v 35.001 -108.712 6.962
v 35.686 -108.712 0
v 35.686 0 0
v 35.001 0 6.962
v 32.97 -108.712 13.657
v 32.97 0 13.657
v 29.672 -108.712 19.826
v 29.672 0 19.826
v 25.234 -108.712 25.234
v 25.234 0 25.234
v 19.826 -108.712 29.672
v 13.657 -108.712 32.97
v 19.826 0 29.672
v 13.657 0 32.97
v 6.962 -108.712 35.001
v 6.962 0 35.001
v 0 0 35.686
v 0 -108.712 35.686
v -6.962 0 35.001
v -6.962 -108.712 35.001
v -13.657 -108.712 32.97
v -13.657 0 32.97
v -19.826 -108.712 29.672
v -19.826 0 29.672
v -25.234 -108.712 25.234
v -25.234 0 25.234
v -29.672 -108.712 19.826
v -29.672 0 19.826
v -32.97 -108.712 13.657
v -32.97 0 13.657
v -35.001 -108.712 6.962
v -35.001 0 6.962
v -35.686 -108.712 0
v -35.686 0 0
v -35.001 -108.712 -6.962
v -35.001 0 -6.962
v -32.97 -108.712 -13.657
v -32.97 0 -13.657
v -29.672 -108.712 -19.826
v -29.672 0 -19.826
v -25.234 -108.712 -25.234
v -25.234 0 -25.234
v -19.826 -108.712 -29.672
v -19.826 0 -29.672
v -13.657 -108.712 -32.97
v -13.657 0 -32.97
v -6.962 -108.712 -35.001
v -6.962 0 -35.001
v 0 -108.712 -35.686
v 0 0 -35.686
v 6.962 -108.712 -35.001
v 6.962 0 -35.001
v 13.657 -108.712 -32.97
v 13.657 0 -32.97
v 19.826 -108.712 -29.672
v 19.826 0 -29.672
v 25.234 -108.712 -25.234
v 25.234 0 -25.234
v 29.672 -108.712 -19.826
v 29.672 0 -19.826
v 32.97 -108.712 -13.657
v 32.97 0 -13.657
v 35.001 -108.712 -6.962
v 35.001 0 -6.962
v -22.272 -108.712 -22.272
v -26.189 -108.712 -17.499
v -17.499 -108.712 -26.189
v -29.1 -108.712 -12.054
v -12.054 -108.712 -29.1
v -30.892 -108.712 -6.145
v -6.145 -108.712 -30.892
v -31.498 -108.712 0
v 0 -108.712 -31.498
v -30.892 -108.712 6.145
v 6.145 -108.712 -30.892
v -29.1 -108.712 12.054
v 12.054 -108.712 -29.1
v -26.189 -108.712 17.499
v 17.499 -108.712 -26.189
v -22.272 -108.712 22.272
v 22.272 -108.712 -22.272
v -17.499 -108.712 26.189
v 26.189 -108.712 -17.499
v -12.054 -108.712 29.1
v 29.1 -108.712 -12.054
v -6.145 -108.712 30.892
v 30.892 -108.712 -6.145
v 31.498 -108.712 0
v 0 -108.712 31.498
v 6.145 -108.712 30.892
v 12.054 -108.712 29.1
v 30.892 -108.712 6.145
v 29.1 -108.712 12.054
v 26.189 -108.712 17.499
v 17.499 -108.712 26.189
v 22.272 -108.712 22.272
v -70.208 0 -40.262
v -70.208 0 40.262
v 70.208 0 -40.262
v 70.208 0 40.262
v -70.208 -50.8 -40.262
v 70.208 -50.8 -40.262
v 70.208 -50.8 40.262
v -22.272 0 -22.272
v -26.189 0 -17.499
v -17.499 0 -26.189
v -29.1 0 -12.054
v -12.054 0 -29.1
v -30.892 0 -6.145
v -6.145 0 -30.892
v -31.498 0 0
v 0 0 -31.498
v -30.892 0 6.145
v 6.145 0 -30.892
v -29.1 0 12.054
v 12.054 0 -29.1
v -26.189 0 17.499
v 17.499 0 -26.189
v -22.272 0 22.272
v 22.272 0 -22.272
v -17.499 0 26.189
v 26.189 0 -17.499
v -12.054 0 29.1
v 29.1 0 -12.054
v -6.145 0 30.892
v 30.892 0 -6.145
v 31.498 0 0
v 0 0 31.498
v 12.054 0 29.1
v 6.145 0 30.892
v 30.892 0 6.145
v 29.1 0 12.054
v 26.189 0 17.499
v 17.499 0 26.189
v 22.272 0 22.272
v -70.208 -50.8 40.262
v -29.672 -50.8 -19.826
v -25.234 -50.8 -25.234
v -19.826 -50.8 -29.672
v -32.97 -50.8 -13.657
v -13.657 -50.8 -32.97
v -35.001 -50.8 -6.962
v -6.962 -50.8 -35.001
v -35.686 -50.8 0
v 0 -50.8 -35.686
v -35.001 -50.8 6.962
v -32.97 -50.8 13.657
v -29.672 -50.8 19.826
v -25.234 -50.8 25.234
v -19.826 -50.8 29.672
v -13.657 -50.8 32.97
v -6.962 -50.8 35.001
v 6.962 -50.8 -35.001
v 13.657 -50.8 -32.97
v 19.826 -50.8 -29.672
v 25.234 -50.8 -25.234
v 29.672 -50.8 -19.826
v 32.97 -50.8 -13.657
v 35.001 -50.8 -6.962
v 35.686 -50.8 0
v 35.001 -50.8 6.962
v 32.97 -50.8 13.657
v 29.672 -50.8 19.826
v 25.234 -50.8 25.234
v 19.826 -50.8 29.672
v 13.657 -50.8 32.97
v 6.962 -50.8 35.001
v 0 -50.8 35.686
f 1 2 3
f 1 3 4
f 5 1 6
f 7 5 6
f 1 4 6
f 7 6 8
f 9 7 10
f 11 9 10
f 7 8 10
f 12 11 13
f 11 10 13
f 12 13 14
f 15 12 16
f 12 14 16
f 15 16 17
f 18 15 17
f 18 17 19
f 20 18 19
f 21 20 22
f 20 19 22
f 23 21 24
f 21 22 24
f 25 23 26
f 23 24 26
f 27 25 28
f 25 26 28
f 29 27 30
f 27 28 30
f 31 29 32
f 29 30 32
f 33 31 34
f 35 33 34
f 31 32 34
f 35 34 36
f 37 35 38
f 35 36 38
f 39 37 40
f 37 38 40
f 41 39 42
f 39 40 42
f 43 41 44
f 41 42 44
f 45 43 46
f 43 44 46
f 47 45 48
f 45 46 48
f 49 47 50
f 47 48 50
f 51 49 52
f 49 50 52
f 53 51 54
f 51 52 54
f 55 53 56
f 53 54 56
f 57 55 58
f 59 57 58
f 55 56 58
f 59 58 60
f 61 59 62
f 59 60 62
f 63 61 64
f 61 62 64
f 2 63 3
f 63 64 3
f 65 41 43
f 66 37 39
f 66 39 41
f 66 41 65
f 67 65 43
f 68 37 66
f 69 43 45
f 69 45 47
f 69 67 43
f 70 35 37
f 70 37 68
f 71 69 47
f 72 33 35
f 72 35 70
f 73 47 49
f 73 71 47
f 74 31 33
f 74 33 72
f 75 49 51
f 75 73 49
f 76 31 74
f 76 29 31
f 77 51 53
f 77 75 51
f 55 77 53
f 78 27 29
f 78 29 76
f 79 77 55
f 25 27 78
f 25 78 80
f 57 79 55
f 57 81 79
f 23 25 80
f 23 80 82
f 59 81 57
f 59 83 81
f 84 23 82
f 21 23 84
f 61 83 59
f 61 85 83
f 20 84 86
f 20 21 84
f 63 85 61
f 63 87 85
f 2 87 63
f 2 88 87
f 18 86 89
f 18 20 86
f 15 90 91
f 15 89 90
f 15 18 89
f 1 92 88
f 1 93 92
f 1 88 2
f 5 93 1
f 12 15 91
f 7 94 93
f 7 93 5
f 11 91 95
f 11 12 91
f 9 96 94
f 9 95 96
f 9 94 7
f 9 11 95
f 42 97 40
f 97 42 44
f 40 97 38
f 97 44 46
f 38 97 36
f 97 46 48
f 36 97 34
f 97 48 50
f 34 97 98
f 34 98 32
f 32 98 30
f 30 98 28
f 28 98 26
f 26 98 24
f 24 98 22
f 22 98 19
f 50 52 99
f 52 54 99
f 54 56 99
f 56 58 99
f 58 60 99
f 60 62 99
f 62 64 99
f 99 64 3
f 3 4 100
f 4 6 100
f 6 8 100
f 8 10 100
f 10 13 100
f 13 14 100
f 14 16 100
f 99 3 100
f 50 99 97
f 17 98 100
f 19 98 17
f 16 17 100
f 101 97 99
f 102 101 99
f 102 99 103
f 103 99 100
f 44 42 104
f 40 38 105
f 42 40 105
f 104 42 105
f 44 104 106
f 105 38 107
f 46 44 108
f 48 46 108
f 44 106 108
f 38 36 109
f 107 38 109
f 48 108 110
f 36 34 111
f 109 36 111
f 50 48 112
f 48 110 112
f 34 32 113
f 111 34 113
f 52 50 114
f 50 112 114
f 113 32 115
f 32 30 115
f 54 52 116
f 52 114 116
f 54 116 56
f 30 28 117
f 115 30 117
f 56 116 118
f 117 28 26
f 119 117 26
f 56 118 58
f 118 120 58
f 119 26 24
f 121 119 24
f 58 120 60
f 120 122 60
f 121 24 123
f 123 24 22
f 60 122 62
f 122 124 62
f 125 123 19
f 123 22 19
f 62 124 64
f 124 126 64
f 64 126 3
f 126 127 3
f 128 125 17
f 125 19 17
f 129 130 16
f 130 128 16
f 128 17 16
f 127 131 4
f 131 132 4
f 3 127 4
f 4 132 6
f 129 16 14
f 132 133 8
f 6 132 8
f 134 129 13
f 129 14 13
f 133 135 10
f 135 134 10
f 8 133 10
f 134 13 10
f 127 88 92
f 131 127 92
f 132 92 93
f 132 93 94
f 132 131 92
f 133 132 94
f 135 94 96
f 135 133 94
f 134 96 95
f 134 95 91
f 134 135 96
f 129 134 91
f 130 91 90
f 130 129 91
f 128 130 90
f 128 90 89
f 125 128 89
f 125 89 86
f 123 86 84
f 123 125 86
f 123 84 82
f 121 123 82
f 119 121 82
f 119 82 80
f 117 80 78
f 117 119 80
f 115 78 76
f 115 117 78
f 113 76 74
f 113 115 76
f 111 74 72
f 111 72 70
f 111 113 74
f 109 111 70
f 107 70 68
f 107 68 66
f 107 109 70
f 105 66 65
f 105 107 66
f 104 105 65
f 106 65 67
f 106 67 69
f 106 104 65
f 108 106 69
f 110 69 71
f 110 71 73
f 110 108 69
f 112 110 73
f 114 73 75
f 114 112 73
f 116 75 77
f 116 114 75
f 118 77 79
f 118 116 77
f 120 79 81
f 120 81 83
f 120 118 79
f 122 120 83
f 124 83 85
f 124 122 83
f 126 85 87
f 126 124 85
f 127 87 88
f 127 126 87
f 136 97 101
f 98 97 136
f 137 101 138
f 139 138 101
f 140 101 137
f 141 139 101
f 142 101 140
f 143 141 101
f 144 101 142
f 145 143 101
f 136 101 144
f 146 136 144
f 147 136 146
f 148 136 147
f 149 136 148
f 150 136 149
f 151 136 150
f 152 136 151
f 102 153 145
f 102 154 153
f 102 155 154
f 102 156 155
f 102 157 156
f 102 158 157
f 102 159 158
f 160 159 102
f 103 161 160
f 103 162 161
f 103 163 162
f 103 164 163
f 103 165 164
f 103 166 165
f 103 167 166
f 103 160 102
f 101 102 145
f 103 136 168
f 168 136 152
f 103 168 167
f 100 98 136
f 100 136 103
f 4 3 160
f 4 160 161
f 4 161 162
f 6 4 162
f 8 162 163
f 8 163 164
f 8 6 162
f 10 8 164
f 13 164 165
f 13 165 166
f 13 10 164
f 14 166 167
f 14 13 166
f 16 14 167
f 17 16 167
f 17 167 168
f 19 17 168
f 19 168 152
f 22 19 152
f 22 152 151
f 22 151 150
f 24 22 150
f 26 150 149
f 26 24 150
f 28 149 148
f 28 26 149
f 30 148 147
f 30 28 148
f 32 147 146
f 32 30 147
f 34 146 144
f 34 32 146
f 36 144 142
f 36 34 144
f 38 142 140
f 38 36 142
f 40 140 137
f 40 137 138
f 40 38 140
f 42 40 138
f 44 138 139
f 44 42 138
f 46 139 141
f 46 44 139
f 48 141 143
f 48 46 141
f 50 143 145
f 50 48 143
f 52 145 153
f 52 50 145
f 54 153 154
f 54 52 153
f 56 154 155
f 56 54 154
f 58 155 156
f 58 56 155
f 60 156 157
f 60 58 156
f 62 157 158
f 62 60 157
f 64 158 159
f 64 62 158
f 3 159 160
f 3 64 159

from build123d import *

# Parameters (mm, degrees)
F0_W     = 140.415922
F0_H     = 80.524236
F0_R     = 35.686314
F1_DEPTH = 50.8
F0_R_2   = 31.497511
F2_DEPTH = 108.712


with BuildPart() as f1:
    # F0 (on Front) → F1 (new body)
    with BuildSketch(Plane.XZ):
        Rectangle(F0_W, F0_H)
        Circle(F0_R, mode=Mode.SUBTRACT)
    extrude(amount=F1_DEPTH)


with BuildPart() as f2:
    # F0 (on Front) → F2 (new body)
    with BuildSketch(Plane.XZ):
        Circle(F0_R)
        Circle(F0_R_2, mode=Mode.SUBTRACT)
    extrude(amount=F2_DEPTH)


solid = Compound([f1.part, f2.part])
